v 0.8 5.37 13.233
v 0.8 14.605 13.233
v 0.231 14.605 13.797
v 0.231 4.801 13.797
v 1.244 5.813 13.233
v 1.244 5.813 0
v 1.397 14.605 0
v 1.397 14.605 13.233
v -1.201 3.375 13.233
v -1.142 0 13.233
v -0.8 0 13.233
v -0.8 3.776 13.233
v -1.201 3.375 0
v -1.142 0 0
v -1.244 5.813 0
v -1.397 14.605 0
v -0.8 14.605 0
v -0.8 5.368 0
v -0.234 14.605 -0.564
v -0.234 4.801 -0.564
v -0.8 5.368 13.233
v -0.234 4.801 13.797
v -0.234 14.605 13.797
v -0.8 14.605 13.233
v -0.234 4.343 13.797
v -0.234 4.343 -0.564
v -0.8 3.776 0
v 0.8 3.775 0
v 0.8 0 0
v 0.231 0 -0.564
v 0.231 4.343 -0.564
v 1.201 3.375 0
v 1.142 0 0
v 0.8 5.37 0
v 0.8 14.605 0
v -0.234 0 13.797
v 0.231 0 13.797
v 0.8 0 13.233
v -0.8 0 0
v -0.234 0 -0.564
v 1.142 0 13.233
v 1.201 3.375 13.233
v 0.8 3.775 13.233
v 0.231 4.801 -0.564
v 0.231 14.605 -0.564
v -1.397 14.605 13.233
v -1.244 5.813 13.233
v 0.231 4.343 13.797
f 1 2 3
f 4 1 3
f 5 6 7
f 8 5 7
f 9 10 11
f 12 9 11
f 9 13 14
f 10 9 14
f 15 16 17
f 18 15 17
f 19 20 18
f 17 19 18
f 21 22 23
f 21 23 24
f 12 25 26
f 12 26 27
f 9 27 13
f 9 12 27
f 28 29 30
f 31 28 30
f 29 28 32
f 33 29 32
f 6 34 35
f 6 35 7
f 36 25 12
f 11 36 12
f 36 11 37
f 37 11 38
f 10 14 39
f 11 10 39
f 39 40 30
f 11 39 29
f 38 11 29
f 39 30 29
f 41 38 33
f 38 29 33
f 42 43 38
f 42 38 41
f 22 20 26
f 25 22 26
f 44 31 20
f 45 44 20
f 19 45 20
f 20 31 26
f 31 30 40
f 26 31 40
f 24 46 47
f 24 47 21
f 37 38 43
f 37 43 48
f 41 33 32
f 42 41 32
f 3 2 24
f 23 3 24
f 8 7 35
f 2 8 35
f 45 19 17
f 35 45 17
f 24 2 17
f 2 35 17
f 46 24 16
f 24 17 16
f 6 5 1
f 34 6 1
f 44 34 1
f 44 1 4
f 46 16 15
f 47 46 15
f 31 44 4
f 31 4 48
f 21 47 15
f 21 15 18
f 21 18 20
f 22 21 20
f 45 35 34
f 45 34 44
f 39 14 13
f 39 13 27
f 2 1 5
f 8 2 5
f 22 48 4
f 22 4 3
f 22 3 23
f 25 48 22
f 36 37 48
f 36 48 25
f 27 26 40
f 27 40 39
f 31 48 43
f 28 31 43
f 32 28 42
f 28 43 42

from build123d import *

# Parameters (mm, degrees)
BOSS_EXTRUDE1_DEPTH = 13.2334
BOSS_EXTRUDE2_DEPTH = 14.605
CUT_EXTRUDE1_DEPTH  = 14.36116


with BuildPart() as part:
    # Sketch1 → Boss-Extrude1 (new body)
    with BuildSketch(Plane.XY):
        Polygon((-1.142068777, 0), (1.142068777, 0), (1.397, 14.605), (-1.397, 14.605), align=None)
    extrude(amount=BOSS_EXTRUDE1_DEPTH)

    # Sketch2 → Boss-Extrude2 (add)
    with BuildSketch(Plane.XZ):
        Polygon((-0.8001, 13.2334), (0.8001, 13.2334), (0.23114, 13.79728), (-0.23368, 13.79728), align=None)
    boss_extrude2 = extrude(amount=-BOSS_EXTRUDE2_DEPTH)

    # Mirror1: Boss-Extrude2 across plane
    add(boss_extrude2.mirror(Plane.XY.offset(6.6167)))

    # Sketch3 → Cut-Extrude1 (cut)
    with BuildSketch(Plane.XY.offset(13.79728)):
        Polygon((-1.243534982, 5.812994982), (-0.23368, 4.8006), (-0.23368, 4.3434), (-1.200976725, 3.374834107), align=None)
        Polygon((1.243534982, 5.812994982), (0.23114, 4.8006), (0.23114, 4.3434), (1.200976725, 3.374834107), align=None)
    extrude(amount=-CUT_EXTRUDE1_DEPTH, mode=Mode.SUBTRACT)


solid = part.part
